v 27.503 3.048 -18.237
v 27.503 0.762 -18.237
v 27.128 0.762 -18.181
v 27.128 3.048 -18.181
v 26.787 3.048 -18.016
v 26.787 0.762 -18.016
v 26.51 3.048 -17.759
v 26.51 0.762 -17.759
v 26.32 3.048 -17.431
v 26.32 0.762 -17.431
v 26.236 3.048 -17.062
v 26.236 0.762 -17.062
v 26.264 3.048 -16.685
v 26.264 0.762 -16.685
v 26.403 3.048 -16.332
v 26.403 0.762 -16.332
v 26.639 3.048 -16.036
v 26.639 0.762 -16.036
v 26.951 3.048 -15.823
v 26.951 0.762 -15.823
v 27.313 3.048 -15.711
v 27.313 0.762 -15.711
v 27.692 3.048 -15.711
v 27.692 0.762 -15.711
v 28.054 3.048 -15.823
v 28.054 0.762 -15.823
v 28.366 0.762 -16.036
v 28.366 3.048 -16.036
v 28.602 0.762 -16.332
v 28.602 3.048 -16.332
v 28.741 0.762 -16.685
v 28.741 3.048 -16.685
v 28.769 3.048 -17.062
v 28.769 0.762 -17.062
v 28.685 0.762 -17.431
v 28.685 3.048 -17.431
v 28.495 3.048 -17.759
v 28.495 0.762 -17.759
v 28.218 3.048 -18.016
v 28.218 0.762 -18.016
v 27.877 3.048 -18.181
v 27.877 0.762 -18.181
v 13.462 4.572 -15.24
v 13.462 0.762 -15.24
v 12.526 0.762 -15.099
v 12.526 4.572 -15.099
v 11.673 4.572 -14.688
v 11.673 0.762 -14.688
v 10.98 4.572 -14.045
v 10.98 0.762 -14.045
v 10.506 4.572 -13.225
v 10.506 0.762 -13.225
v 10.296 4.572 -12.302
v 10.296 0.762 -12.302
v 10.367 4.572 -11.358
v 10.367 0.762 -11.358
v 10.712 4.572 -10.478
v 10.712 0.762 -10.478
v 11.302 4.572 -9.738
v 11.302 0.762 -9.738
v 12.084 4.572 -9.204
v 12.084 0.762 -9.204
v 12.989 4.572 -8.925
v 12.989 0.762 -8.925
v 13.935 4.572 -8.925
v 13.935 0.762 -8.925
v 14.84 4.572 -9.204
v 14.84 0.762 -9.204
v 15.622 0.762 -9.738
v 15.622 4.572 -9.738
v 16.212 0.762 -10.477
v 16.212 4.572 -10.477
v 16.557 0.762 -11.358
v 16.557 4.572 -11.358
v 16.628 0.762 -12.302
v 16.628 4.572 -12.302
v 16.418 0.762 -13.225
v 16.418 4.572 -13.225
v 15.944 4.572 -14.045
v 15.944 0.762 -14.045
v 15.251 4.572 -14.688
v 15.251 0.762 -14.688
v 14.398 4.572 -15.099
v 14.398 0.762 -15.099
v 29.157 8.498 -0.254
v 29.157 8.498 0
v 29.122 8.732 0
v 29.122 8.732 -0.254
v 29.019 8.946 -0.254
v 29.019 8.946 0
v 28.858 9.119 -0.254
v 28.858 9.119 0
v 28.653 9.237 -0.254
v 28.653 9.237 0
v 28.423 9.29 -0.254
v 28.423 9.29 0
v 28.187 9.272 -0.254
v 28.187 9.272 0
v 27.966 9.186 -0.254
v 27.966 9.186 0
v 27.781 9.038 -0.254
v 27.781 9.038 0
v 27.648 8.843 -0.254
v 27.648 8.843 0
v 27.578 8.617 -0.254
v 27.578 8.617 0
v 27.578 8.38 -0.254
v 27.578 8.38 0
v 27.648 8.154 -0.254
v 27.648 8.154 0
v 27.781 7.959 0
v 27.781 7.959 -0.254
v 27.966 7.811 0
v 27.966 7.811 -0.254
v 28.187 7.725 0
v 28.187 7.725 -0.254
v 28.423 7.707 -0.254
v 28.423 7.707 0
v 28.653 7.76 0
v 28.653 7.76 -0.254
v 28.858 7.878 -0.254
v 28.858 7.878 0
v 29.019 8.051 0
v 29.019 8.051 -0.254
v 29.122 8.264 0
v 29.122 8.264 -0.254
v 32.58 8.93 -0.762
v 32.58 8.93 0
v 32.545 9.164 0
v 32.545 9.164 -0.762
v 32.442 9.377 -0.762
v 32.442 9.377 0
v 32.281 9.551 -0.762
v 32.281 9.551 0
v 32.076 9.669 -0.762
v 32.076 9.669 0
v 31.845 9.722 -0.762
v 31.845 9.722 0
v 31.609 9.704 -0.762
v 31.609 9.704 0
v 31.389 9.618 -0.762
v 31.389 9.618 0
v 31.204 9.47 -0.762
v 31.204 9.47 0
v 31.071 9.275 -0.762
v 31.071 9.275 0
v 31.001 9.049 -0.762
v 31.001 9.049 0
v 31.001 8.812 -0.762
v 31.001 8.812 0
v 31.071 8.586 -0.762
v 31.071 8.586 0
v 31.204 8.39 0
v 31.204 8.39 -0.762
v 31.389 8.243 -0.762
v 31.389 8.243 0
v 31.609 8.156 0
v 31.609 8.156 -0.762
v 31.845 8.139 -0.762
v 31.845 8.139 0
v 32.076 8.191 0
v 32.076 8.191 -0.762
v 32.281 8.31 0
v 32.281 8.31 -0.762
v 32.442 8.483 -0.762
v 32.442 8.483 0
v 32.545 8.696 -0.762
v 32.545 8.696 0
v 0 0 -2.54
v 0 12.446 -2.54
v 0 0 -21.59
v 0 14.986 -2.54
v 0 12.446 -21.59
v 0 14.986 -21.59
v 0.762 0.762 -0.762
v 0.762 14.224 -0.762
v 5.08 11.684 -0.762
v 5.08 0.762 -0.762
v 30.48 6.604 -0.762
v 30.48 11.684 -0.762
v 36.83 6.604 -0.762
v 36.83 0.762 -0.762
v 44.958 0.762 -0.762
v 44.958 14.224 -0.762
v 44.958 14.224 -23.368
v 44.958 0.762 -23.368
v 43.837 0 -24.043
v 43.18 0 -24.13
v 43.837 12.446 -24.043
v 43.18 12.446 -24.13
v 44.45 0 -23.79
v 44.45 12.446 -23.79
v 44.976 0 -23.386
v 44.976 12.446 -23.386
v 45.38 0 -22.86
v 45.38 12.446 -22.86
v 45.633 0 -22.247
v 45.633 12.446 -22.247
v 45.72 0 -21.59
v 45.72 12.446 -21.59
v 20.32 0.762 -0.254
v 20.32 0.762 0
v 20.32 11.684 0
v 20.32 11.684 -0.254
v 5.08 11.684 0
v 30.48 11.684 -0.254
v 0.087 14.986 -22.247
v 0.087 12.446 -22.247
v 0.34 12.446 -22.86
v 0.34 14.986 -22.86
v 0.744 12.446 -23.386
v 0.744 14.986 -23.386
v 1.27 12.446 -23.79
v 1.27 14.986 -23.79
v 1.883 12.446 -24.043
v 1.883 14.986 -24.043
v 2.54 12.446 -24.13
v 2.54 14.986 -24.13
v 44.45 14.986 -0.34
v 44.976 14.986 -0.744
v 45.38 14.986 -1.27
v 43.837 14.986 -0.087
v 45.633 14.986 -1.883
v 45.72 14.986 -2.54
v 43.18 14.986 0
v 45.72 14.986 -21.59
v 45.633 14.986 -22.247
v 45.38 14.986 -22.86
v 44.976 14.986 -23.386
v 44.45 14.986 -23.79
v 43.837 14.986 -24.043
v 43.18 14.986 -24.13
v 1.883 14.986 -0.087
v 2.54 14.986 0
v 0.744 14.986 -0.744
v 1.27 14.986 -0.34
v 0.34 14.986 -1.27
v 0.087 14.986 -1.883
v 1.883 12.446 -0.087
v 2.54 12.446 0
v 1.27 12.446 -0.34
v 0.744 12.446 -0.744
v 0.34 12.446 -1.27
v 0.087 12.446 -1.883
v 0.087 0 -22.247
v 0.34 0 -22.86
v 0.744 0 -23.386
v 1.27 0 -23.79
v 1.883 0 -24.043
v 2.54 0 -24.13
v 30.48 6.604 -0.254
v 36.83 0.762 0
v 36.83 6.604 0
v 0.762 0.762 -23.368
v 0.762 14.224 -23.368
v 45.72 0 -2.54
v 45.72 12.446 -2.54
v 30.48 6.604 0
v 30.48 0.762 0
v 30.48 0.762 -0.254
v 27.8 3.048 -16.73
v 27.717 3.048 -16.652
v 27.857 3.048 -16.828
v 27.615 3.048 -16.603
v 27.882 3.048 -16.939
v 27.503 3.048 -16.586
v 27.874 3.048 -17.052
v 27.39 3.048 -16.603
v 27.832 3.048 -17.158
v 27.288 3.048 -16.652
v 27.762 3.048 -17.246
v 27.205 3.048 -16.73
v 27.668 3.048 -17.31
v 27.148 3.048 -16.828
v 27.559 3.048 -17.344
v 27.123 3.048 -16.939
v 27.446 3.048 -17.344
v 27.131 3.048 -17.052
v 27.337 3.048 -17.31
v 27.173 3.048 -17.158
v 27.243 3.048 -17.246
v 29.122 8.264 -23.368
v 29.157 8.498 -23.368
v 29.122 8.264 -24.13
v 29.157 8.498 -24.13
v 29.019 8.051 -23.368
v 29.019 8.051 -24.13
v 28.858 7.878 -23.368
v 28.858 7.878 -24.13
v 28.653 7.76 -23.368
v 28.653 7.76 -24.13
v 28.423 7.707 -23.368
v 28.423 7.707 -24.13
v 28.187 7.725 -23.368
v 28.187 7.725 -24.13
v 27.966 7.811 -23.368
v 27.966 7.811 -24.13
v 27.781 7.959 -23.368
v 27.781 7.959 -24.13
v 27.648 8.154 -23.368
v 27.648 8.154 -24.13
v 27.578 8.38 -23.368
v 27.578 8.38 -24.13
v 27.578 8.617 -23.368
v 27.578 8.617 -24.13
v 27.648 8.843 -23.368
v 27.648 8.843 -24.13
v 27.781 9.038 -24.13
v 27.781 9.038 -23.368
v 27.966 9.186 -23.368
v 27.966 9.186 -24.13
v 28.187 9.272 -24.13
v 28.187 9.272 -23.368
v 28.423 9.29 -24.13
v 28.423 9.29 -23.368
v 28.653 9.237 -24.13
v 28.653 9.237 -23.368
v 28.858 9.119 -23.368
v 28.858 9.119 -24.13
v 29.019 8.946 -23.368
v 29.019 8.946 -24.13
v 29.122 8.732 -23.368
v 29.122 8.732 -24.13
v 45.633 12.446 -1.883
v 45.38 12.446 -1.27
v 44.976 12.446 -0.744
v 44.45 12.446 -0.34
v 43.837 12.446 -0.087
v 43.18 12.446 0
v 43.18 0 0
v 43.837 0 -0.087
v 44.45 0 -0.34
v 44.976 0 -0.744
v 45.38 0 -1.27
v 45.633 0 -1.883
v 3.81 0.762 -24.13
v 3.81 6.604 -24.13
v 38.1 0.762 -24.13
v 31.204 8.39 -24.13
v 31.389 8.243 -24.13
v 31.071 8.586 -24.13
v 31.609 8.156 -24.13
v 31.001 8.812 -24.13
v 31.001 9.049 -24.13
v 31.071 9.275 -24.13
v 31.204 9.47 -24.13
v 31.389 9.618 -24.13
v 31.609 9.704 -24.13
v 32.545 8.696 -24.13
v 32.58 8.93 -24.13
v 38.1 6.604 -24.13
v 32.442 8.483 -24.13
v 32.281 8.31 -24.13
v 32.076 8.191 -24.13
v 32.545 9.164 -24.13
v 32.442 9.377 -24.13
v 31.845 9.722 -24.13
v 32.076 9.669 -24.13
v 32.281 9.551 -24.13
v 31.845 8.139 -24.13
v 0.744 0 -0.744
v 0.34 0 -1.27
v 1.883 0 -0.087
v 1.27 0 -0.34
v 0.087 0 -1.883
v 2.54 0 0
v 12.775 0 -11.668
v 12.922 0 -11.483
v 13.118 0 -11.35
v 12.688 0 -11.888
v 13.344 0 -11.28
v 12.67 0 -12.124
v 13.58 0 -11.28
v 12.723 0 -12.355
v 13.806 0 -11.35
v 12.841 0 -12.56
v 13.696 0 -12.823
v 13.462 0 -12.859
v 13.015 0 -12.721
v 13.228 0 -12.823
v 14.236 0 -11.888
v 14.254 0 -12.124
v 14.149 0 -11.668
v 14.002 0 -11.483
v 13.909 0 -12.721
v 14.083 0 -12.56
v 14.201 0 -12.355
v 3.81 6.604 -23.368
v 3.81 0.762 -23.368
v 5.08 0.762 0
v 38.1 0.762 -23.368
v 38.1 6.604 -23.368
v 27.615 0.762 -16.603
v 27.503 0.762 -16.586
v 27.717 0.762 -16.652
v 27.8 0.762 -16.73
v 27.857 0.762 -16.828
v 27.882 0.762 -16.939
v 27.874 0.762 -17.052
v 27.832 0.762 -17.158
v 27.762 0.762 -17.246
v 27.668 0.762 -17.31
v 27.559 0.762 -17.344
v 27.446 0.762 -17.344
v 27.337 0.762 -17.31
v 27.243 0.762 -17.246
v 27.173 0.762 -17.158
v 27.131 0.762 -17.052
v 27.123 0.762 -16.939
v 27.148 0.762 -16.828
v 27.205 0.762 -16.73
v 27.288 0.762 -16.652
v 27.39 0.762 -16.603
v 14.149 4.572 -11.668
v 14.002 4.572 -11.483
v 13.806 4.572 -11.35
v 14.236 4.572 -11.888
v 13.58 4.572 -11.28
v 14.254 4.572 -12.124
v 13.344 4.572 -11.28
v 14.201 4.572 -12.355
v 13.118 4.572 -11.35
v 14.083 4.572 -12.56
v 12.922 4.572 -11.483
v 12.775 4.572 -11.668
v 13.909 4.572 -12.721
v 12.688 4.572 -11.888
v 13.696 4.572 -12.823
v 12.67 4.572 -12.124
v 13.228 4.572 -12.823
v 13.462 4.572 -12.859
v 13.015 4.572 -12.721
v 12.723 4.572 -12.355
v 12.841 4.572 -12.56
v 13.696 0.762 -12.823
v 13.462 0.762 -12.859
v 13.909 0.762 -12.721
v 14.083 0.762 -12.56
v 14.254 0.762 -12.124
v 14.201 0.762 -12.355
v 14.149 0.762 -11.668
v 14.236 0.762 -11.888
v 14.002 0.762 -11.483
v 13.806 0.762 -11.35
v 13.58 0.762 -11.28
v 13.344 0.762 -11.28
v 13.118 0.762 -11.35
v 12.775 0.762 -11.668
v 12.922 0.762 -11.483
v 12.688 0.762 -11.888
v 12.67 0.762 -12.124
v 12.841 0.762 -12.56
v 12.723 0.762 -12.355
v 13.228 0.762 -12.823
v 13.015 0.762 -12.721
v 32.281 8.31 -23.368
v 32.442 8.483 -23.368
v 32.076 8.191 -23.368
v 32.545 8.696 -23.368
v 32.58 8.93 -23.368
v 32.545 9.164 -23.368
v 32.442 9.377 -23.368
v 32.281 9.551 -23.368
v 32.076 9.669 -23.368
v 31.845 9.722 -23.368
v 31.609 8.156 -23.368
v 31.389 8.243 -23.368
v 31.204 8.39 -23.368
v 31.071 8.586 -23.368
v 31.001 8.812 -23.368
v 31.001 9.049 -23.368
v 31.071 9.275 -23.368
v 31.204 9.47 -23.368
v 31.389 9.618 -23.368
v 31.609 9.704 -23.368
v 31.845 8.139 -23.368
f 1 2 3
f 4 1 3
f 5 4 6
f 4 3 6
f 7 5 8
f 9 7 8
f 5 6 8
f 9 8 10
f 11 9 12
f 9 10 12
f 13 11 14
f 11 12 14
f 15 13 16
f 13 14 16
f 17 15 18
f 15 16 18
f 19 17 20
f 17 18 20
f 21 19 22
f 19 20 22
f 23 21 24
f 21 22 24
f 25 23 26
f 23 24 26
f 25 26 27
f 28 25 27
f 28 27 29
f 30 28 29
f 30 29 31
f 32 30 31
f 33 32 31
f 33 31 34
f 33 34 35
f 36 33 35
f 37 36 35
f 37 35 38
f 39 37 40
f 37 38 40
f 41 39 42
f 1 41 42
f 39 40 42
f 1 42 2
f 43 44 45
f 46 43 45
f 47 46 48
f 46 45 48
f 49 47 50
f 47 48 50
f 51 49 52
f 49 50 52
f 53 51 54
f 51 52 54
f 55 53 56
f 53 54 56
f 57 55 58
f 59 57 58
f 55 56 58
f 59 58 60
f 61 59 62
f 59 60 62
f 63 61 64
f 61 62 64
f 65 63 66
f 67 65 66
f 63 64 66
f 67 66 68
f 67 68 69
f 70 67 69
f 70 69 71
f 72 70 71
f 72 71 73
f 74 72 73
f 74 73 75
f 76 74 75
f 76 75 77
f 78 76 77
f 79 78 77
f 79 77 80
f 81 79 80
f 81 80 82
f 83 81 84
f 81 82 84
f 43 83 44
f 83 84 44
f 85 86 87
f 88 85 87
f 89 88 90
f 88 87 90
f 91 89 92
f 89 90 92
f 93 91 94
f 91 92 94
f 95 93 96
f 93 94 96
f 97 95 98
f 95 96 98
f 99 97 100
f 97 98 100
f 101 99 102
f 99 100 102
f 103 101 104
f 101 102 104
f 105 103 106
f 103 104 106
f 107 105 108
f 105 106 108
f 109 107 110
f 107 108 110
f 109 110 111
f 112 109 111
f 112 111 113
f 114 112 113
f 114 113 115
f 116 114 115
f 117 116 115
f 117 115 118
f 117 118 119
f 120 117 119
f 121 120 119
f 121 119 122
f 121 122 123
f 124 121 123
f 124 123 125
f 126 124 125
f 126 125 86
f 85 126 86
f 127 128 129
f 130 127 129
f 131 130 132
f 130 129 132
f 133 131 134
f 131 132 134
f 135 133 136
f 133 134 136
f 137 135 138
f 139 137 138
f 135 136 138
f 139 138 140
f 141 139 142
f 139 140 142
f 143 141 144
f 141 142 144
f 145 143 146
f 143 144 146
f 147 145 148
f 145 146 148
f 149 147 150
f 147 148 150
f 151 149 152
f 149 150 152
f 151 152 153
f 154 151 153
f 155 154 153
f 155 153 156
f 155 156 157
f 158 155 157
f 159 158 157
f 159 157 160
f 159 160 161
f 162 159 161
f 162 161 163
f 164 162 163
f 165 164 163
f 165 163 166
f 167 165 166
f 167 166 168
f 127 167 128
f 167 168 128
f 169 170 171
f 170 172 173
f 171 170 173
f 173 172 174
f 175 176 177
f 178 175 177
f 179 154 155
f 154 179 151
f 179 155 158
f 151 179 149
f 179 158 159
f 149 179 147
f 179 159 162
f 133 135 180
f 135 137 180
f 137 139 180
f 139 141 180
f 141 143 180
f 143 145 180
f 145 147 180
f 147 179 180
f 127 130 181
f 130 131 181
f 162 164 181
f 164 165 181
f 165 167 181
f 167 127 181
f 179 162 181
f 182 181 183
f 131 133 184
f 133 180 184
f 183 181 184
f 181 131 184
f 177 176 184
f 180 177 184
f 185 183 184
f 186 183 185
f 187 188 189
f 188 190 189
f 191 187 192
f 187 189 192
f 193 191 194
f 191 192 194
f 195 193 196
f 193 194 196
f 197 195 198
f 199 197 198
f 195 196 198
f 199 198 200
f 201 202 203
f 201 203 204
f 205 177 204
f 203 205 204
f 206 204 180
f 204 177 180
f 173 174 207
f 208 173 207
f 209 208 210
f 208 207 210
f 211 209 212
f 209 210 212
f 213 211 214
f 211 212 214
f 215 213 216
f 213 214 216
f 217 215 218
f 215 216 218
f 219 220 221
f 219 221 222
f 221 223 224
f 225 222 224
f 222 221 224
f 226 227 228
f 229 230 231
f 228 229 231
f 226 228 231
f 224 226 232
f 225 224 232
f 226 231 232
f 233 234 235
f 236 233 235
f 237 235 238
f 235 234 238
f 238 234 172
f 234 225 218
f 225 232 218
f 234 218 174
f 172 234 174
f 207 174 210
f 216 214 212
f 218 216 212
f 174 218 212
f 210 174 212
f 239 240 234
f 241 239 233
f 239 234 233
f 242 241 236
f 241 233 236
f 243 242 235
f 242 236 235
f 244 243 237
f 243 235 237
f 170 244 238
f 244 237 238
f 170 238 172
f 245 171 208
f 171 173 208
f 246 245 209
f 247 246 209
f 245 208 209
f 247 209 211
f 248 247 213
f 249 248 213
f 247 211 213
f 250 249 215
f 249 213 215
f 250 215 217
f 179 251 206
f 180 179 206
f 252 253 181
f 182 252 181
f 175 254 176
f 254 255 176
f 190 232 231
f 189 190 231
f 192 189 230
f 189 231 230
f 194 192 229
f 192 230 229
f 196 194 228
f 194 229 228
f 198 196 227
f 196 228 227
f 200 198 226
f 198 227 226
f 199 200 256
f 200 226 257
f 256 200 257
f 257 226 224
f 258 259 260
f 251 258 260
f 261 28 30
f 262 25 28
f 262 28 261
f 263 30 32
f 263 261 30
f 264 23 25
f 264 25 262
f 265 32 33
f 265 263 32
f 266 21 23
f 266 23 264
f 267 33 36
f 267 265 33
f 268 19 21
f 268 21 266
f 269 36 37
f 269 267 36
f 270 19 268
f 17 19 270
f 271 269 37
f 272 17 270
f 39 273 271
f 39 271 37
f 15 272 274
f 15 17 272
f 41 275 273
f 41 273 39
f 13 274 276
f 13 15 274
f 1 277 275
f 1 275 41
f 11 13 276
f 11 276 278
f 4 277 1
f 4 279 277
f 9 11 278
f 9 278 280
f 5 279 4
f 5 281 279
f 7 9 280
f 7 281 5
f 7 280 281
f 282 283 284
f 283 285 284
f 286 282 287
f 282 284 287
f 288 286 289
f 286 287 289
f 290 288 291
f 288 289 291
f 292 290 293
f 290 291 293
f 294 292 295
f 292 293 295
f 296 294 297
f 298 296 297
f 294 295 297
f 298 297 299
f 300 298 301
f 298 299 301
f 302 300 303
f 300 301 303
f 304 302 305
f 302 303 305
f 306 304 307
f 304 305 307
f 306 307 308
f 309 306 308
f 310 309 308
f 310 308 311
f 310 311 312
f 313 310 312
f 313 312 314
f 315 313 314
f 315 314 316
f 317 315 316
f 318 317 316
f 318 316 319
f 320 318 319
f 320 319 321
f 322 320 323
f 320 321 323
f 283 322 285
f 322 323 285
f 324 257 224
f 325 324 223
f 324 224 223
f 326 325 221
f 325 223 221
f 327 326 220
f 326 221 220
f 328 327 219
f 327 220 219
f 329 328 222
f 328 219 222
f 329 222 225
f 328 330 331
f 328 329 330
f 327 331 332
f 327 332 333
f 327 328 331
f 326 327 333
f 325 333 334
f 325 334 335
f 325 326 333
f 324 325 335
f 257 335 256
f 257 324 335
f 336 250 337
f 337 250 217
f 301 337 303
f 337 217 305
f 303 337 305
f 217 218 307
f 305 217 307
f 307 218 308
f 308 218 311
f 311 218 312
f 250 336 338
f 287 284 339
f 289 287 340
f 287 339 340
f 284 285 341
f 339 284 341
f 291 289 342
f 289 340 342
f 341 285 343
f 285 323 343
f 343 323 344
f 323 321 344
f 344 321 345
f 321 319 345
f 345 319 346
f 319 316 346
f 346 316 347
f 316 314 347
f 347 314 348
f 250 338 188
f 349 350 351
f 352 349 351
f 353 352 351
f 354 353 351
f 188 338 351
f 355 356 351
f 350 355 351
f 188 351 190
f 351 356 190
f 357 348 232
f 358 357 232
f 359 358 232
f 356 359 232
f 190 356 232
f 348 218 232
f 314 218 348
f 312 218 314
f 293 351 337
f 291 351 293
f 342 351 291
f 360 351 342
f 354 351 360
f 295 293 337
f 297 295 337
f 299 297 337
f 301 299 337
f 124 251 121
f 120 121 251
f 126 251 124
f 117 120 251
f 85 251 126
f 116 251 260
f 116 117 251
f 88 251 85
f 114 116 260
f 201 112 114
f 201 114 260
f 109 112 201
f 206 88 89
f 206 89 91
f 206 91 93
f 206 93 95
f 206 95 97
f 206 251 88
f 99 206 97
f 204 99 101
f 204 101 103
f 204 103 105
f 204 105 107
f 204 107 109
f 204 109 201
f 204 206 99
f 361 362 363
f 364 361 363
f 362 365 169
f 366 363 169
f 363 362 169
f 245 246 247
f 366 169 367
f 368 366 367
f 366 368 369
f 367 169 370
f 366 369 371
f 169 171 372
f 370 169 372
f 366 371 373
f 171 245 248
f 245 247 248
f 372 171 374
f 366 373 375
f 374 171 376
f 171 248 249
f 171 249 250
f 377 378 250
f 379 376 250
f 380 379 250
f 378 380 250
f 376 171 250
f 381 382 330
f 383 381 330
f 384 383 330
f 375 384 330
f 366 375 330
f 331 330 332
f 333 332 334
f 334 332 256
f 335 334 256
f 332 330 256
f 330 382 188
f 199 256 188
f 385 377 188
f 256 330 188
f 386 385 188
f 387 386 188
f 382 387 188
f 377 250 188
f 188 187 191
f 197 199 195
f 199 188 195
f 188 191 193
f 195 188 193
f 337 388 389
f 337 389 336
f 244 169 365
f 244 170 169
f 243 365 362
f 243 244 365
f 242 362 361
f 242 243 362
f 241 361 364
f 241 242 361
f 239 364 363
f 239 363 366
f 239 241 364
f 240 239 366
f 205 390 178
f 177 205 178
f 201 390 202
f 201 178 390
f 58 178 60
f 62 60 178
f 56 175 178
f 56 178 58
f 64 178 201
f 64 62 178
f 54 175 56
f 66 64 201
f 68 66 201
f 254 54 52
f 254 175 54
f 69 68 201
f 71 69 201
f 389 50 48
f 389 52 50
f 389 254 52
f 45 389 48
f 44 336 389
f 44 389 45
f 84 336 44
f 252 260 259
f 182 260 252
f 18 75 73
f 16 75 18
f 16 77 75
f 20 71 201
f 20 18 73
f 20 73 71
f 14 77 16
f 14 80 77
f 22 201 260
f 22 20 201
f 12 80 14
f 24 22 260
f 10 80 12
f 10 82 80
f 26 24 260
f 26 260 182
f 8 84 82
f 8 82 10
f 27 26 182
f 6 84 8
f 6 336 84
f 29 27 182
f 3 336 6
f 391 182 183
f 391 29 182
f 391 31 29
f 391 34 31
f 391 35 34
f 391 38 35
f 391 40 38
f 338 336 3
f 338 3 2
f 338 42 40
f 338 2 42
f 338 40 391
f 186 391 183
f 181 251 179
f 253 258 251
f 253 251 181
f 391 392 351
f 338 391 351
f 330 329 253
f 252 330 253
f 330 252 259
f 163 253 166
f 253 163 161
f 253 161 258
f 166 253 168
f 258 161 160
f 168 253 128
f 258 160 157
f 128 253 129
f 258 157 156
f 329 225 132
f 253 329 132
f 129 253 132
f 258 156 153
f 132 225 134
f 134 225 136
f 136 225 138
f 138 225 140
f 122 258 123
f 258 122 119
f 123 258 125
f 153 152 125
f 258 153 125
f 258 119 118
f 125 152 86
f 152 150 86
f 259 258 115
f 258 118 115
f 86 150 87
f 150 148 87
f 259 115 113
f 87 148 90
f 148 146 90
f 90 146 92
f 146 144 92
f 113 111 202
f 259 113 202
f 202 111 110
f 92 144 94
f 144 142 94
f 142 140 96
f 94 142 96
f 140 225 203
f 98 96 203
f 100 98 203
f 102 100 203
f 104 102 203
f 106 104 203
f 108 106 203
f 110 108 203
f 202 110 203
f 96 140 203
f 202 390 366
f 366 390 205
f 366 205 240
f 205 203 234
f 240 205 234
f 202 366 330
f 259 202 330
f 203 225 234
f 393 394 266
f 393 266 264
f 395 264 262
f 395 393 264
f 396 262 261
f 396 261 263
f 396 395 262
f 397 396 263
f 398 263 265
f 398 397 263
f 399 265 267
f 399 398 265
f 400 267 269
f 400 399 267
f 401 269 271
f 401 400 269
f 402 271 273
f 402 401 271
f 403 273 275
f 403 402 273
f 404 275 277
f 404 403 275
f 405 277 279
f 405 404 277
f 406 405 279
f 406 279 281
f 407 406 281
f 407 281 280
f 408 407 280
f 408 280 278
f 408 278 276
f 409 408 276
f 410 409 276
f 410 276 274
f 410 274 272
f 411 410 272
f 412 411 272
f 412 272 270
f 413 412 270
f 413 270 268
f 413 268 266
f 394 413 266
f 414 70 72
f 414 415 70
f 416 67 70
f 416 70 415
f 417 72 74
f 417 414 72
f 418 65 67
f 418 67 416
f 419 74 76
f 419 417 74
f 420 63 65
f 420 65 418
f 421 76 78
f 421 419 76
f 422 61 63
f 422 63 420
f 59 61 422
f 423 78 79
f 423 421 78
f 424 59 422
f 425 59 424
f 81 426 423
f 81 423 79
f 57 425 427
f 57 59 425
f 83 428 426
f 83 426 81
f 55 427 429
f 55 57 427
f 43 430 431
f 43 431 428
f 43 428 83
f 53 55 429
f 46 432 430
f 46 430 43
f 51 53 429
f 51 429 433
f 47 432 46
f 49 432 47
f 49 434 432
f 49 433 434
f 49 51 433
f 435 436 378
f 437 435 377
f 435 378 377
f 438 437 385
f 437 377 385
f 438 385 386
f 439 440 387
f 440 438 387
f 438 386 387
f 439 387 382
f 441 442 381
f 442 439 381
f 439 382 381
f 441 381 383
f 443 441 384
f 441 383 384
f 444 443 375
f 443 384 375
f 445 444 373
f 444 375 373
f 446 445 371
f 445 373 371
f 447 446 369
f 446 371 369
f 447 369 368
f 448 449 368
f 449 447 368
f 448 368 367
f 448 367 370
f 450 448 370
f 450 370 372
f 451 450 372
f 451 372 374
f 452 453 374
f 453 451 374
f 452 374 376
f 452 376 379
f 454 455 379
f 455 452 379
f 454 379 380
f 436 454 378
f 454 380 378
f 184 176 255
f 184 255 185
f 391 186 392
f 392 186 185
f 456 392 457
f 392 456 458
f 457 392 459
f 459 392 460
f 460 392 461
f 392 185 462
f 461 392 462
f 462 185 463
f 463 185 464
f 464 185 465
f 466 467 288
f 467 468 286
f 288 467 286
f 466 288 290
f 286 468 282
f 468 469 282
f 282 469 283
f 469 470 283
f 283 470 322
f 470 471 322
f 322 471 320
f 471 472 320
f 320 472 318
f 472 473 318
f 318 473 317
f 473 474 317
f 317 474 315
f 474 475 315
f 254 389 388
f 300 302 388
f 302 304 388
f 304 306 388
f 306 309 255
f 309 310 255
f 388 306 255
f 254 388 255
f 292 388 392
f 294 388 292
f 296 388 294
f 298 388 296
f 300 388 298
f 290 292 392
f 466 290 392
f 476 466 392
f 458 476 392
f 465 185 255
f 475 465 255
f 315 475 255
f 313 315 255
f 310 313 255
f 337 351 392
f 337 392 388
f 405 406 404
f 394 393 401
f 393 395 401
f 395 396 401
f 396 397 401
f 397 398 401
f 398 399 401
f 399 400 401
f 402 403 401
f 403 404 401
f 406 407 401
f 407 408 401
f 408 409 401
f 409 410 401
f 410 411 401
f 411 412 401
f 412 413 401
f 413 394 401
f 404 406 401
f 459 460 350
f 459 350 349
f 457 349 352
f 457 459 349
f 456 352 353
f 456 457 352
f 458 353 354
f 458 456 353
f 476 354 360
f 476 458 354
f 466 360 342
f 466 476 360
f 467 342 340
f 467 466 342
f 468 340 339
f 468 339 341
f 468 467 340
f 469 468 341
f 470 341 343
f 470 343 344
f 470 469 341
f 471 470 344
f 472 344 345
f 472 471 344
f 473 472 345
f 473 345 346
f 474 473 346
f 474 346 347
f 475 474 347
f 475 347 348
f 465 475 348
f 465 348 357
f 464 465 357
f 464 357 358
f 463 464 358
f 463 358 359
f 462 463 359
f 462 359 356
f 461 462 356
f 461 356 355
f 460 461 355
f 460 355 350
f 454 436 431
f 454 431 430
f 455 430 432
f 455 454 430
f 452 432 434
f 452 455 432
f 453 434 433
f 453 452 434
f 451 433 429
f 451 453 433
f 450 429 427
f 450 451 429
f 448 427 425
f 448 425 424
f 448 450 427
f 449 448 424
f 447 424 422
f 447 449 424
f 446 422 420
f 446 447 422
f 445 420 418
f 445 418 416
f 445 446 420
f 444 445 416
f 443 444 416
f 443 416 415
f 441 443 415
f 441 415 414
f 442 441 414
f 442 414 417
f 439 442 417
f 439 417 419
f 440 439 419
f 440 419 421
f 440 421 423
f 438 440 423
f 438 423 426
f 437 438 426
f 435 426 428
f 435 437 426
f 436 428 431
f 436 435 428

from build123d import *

# Parameters (mm, degrees)
SKETCH1_W           = 45.72
SKETCH1_H           = 24.13
BOSS_EXTRUDE1_DEPTH = 12.446
SHELL2_T            = -0.762
SKETCH2_W           = 22.606
SKETCH2_H           = 10.922
BOSS_EXTRUDE2_DEPTH = 0.762
FILLET1_R           = 2.54
SKETCH4_W           = 34.29
SKETCH4_H           = 3.81
SKETCH4_W_2         = 15.24
SKETCH4_H_2         = 2.54
CUT_EXTRUDE2_DEPTH  = 10.922
SKETCH6_W           = 6.35
SKETCH6_H           = 1.27
CUT_EXTRUDE3_DEPTH  = 10.922
SKETCH7_W           = 10.16
SKETCH7_H           = 10.922
CUT_EXTRUDE4_DEPTH  = 0.508
SKETCH8_R           = 3.175
SKETCH8_R_2         = 0.79375
BOSS_EXTRUDE3_DEPTH = 3.81
SKETCH9_R           = 1.27
SKETCH9_R_2         = 0.381
BOSS_EXTRUDE4_DEPTH = 2.286
CUT_EXTRUDE5_REACH  = 55.174
SKETCH10_R          = 0.79375
SKETCH10_R_2        = 0.381
BOSS_EXTRUDE5_START = -0.762
SKETCH11_R          = 0.381
BOSS_EXTRUDE5_DEPTH = 0.762
SKETCH12_R          = 0.79375
CUT_EXTRUDE6_DEPTH  = 0.762
SKETCH13_W          = 34.29
SKETCH13_H          = 5.08
BOSS_EXTRUDE6_DEPTH = 0.762
SKETCH14_R          = 0.79375
CUT_EXTRUDE7_DEPTH  = 54.174037048
BOSS_EXTRUDE7_START = 2.54
BOSS_EXTRUDE7_DEPTH = 2.54
SKETCH16_W          = 44.196
SKETCH16_H          = 22.606
CUT_EXTRUDE9_DEPTH  = 2.54
SKETCH18_W          = 6.35
SKETCH18_H          = 5.08
SKETCH18_R          = 0.79375
BOSS_EXTRUDE8_DEPTH = 0.762
CUT_EXTRUDE12_START = -2.54
SKETCH19_R          = 0.79375
CUT_EXTRUDE12_DEPTH = 2.54


with BuildPart() as part:
    # Sketch1 → Boss-Extrude1 (new body)
    with BuildSketch(Plane(origin=(0, 0, 0), x_dir=(1, 0, 0), z_dir=(0, 1, 0))):
        with Locations((22.86, 12.065)):
            Rectangle(SKETCH1_W, SKETCH1_H)
    extrude(amount=BOSS_EXTRUDE1_DEPTH)

    # Shell2
    shell2_openings = [part.faces().sort_by_distance(p)[0] for p in [
        (0, 6.223, -12.065),
    ]]
    offset(amount=SHELL2_T, openings=shell2_openings, kind=Kind.INTERSECTION)

    # Sketch2 → Boss-Extrude2 (add)
    with BuildSketch(Plane.ZY):
        with Locations((-12.065, 6.223)):
            Rectangle(SKETCH2_W, SKETCH2_H)
    extrude(amount=-BOSS_EXTRUDE2_DEPTH)

    # Fillet1
    fillet1_edges = [part.edges().sort_by_distance(p)[0] for p in [
        (0, 6.223, -24.13),
        (45.72, 6.223, -24.13),
        (45.72, 6.223, 0),
        (0, 6.223, 0),
    ]]
    fillet(fillet1_edges, radius=FILLET1_R)

    # Sketch4 → Cut-Extrude2 (cut)
    with BuildSketch(Plane(origin=(0, 0.762, 0), x_dir=(1, 0, 0), z_dir=(0, 1, 0))):
        with Locations((20.955, 23.495)):
            Rectangle(SKETCH4_W, SKETCH4_H)
        with Locations((12.7, 0)):
            Rectangle(SKETCH4_W_2, SKETCH4_H_2)
    extrude(amount=CUT_EXTRUDE2_DEPTH, mode=Mode.SUBTRACT)

    # Sketch6 → Cut-Extrude3 (cut)
    with BuildSketch(Plane(origin=(0, 0.762, 0), x_dir=(1, 0, 0), z_dir=(0, 1, 0))):
        with Locations((33.655, 0.635)):
            Rectangle(SKETCH6_W, SKETCH6_H)
    extrude(amount=CUT_EXTRUDE3_DEPTH, mode=Mode.SUBTRACT)

    # Sketch7 → Cut-Extrude4 (cut)
    with BuildSketch(Plane(origin=(0, 0, -0.762), x_dir=(-1, 0, 0), z_dir=(0, 0, -1))):
        with Locations((-25.4, 6.223)):
            Rectangle(SKETCH7_W, SKETCH7_H)
    extrude(amount=-CUT_EXTRUDE4_DEPTH, mode=Mode.SUBTRACT)

    # Sketch8 → Boss-Extrude3 (add)
    with BuildSketch(Plane(origin=(0, 0.762, 0), x_dir=(1, 0, 0), z_dir=(0, 1, 0))):
        with Locations(Location((13.462, 12.065, 0), (0, 0, 90))):
            Circle(SKETCH8_R)
        with Locations(Location((13.462, 12.065, 0), (0, 0, 90))):
            Circle(SKETCH8_R_2, mode=Mode.SUBTRACT)
    extrude(amount=BOSS_EXTRUDE3_DEPTH)

    # Sketch9 → Boss-Extrude4 (add)
    with BuildSketch(Plane(origin=(0, 0.762, 0), x_dir=(1, 0, 0), z_dir=(0, 1, 0))):
        with Locations(Location((27.50252945, 16.967141741, 0), (0, 0, 90))):
            Circle(SKETCH9_R)
        with Locations(Location((27.50252945, 16.967141741, 0), (0, 0, 270))):
            Circle(SKETCH9_R_2, mode=Mode.SUBTRACT)
    extrude(amount=BOSS_EXTRUDE4_DEPTH)

    # Sketch10 → Cut-Extrude5 (cut, up to next)
    with BuildSketch(Plane.XZ, mode=Mode.PRIVATE) as cut_extrude5_sk1:
        with Locations(Location((13.462, -12.065, 0), (0, 0, 270))):
            Circle(SKETCH10_R)
    cut_extrude5_tool1 = extrude(cut_extrude5_sk1.sketch, amount=-CUT_EXTRUDE5_REACH, mode=Mode.PRIVATE) & part.part
    # Sketch10 → Cut-Extrude5 (cut, up to next)
    with BuildSketch(Plane.XZ, mode=Mode.PRIVATE) as cut_extrude5_sk2:
        with Locations(Location((27.50252945, -16.967141741, 0), (0, 0, 270))):
            Circle(SKETCH10_R_2)
    cut_extrude5_tool2 = extrude(cut_extrude5_sk2.sketch, amount=-CUT_EXTRUDE5_REACH, mode=Mode.PRIVATE) & part.part
    # Sketch10 → Cut-Extrude5 (cut, up to next)
    with BuildSketch(Plane.XZ, mode=Mode.PRIVATE) as cut_extrude5_sk3:
        with Locations(Location((33.344788808, -6.833988408, 0), (0, 0, 270))):
            Circle(SKETCH10_R_2)
    cut_extrude5_tool3 = extrude(cut_extrude5_sk3.sketch, amount=-CUT_EXTRUDE5_REACH, mode=Mode.PRIVATE) & part.part
    add(cut_extrude5_tool1.solids().sort_by_distance((13.462, 0, -12.065))[0], mode=Mode.SUBTRACT)
    add(cut_extrude5_tool2.solids().sort_by_distance((27.502529, 0, -16.967142))[0], mode=Mode.SUBTRACT)
    add(cut_extrude5_tool3.solids().sort_by_distance((33.344789, 0, -6.833988))[0], mode=Mode.SUBTRACT)

    # Sketch11 → Boss-Extrude5 (add)
    with BuildSketch(Plane.XZ.offset(BOSS_EXTRUDE5_START)):
        with Locations(Location((27.50252945, -16.967141741, 0), (0, 0, 270))):
            Circle(SKETCH11_R)
        with Locations((33.344788808, -6.833988408)):
            Circle(SKETCH11_R)
    extrude(amount=BOSS_EXTRUDE5_DEPTH)

    # Sketch12 → Cut-Extrude6 (cut)
    with BuildSketch(Plane.XY):
        with Locations((28.36322115, 8.4984082)):
            Circle(SKETCH12_R)
    extrude(amount=-CUT_EXTRUDE6_DEPTH, mode=Mode.SUBTRACT)

    # Sketch13 → Boss-Extrude6 (add)
    with BuildSketch(Plane(origin=(0, 0, -24.13), x_dir=(-1, 0, 0), z_dir=(0, 0, -1))):
        with Locations((-20.955, 9.144)):
            Rectangle(SKETCH13_W, SKETCH13_H)
    extrude(amount=-BOSS_EXTRUDE6_DEPTH)

    # Sketch14 → Cut-Extrude7 (cut, through all)
    with BuildSketch(Plane(origin=(0, 0, -24.13), x_dir=(-1, 0, 0), z_dir=(0, 0, -1))):
        with Locations(Location((-28.36322115, 8.4984082, 0), (0, 0, 180))):
            Circle(SKETCH14_R)
    extrude(amount=-CUT_EXTRUDE7_DEPTH, mode=Mode.SUBTRACT)

    # Sketch15 → Boss-Extrude7 (add)
    with BuildSketch(Plane(origin=(0, 12.446, 0), x_dir=(1, 0, 0), z_dir=(0, 1, 0)).offset(BOSS_EXTRUDE7_START)):
        with BuildLine():
            Line((0, 2.54), (0, 21.59))
            ThreePointArc((0, 21.59), (0.743948776, 23.386051224), (2.54, 24.13))
            Line((2.54, 24.13), (43.18, 24.13))
            ThreePointArc((43.18, 24.13), (44.976051224, 23.386051224), (45.72, 21.59))
            Line((45.72, 21.59), (45.72, 2.54))
            ThreePointArc((45.72, 2.54), (44.976051224, 0.743948776), (43.18, 0))
            Line((43.18, 0), (2.54, 0))
            ThreePointArc((2.54, 0), (0.743948776, 0.743948776), (0, 2.54))
        make_face()
    extrude(amount=-BOSS_EXTRUDE7_DEPTH)

    # Sketch16 → Cut-Extrude9 (cut)
    with BuildSketch(Plane.XZ.offset(-11.684)):
        with Locations((22.86, -12.065)):
            Rectangle(SKETCH16_W, SKETCH16_H)
    extrude(amount=-CUT_EXTRUDE9_DEPTH, mode=Mode.SUBTRACT)

    # Sketch18 → Boss-Extrude8 (add)
    with BuildSketch(Plane.XY):
        with Locations((33.655, 9.144)):
            Rectangle(SKETCH18_W, SKETCH18_H)
        with Locations((31.786109402, 8.930211756)):
            Circle(SKETCH18_R, mode=Mode.SUBTRACT)
    extrude(amount=-BOSS_EXTRUDE8_DEPTH)

    # Sketch19 → Cut-Extrude12 (cut)
    with BuildSketch(Plane(origin=(0, 0, -24.13), x_dir=(-1, 0, 0), z_dir=(0, 0, -1)).offset(CUT_EXTRUDE12_START)):
        with Locations(Location((-31.786109402, 8.930211756, 0), (0, 0, 180))):
            Circle(SKETCH19_R)
    extrude(amount=CUT_EXTRUDE12_DEPTH, mode=Mode.SUBTRACT)


solid = part.part
